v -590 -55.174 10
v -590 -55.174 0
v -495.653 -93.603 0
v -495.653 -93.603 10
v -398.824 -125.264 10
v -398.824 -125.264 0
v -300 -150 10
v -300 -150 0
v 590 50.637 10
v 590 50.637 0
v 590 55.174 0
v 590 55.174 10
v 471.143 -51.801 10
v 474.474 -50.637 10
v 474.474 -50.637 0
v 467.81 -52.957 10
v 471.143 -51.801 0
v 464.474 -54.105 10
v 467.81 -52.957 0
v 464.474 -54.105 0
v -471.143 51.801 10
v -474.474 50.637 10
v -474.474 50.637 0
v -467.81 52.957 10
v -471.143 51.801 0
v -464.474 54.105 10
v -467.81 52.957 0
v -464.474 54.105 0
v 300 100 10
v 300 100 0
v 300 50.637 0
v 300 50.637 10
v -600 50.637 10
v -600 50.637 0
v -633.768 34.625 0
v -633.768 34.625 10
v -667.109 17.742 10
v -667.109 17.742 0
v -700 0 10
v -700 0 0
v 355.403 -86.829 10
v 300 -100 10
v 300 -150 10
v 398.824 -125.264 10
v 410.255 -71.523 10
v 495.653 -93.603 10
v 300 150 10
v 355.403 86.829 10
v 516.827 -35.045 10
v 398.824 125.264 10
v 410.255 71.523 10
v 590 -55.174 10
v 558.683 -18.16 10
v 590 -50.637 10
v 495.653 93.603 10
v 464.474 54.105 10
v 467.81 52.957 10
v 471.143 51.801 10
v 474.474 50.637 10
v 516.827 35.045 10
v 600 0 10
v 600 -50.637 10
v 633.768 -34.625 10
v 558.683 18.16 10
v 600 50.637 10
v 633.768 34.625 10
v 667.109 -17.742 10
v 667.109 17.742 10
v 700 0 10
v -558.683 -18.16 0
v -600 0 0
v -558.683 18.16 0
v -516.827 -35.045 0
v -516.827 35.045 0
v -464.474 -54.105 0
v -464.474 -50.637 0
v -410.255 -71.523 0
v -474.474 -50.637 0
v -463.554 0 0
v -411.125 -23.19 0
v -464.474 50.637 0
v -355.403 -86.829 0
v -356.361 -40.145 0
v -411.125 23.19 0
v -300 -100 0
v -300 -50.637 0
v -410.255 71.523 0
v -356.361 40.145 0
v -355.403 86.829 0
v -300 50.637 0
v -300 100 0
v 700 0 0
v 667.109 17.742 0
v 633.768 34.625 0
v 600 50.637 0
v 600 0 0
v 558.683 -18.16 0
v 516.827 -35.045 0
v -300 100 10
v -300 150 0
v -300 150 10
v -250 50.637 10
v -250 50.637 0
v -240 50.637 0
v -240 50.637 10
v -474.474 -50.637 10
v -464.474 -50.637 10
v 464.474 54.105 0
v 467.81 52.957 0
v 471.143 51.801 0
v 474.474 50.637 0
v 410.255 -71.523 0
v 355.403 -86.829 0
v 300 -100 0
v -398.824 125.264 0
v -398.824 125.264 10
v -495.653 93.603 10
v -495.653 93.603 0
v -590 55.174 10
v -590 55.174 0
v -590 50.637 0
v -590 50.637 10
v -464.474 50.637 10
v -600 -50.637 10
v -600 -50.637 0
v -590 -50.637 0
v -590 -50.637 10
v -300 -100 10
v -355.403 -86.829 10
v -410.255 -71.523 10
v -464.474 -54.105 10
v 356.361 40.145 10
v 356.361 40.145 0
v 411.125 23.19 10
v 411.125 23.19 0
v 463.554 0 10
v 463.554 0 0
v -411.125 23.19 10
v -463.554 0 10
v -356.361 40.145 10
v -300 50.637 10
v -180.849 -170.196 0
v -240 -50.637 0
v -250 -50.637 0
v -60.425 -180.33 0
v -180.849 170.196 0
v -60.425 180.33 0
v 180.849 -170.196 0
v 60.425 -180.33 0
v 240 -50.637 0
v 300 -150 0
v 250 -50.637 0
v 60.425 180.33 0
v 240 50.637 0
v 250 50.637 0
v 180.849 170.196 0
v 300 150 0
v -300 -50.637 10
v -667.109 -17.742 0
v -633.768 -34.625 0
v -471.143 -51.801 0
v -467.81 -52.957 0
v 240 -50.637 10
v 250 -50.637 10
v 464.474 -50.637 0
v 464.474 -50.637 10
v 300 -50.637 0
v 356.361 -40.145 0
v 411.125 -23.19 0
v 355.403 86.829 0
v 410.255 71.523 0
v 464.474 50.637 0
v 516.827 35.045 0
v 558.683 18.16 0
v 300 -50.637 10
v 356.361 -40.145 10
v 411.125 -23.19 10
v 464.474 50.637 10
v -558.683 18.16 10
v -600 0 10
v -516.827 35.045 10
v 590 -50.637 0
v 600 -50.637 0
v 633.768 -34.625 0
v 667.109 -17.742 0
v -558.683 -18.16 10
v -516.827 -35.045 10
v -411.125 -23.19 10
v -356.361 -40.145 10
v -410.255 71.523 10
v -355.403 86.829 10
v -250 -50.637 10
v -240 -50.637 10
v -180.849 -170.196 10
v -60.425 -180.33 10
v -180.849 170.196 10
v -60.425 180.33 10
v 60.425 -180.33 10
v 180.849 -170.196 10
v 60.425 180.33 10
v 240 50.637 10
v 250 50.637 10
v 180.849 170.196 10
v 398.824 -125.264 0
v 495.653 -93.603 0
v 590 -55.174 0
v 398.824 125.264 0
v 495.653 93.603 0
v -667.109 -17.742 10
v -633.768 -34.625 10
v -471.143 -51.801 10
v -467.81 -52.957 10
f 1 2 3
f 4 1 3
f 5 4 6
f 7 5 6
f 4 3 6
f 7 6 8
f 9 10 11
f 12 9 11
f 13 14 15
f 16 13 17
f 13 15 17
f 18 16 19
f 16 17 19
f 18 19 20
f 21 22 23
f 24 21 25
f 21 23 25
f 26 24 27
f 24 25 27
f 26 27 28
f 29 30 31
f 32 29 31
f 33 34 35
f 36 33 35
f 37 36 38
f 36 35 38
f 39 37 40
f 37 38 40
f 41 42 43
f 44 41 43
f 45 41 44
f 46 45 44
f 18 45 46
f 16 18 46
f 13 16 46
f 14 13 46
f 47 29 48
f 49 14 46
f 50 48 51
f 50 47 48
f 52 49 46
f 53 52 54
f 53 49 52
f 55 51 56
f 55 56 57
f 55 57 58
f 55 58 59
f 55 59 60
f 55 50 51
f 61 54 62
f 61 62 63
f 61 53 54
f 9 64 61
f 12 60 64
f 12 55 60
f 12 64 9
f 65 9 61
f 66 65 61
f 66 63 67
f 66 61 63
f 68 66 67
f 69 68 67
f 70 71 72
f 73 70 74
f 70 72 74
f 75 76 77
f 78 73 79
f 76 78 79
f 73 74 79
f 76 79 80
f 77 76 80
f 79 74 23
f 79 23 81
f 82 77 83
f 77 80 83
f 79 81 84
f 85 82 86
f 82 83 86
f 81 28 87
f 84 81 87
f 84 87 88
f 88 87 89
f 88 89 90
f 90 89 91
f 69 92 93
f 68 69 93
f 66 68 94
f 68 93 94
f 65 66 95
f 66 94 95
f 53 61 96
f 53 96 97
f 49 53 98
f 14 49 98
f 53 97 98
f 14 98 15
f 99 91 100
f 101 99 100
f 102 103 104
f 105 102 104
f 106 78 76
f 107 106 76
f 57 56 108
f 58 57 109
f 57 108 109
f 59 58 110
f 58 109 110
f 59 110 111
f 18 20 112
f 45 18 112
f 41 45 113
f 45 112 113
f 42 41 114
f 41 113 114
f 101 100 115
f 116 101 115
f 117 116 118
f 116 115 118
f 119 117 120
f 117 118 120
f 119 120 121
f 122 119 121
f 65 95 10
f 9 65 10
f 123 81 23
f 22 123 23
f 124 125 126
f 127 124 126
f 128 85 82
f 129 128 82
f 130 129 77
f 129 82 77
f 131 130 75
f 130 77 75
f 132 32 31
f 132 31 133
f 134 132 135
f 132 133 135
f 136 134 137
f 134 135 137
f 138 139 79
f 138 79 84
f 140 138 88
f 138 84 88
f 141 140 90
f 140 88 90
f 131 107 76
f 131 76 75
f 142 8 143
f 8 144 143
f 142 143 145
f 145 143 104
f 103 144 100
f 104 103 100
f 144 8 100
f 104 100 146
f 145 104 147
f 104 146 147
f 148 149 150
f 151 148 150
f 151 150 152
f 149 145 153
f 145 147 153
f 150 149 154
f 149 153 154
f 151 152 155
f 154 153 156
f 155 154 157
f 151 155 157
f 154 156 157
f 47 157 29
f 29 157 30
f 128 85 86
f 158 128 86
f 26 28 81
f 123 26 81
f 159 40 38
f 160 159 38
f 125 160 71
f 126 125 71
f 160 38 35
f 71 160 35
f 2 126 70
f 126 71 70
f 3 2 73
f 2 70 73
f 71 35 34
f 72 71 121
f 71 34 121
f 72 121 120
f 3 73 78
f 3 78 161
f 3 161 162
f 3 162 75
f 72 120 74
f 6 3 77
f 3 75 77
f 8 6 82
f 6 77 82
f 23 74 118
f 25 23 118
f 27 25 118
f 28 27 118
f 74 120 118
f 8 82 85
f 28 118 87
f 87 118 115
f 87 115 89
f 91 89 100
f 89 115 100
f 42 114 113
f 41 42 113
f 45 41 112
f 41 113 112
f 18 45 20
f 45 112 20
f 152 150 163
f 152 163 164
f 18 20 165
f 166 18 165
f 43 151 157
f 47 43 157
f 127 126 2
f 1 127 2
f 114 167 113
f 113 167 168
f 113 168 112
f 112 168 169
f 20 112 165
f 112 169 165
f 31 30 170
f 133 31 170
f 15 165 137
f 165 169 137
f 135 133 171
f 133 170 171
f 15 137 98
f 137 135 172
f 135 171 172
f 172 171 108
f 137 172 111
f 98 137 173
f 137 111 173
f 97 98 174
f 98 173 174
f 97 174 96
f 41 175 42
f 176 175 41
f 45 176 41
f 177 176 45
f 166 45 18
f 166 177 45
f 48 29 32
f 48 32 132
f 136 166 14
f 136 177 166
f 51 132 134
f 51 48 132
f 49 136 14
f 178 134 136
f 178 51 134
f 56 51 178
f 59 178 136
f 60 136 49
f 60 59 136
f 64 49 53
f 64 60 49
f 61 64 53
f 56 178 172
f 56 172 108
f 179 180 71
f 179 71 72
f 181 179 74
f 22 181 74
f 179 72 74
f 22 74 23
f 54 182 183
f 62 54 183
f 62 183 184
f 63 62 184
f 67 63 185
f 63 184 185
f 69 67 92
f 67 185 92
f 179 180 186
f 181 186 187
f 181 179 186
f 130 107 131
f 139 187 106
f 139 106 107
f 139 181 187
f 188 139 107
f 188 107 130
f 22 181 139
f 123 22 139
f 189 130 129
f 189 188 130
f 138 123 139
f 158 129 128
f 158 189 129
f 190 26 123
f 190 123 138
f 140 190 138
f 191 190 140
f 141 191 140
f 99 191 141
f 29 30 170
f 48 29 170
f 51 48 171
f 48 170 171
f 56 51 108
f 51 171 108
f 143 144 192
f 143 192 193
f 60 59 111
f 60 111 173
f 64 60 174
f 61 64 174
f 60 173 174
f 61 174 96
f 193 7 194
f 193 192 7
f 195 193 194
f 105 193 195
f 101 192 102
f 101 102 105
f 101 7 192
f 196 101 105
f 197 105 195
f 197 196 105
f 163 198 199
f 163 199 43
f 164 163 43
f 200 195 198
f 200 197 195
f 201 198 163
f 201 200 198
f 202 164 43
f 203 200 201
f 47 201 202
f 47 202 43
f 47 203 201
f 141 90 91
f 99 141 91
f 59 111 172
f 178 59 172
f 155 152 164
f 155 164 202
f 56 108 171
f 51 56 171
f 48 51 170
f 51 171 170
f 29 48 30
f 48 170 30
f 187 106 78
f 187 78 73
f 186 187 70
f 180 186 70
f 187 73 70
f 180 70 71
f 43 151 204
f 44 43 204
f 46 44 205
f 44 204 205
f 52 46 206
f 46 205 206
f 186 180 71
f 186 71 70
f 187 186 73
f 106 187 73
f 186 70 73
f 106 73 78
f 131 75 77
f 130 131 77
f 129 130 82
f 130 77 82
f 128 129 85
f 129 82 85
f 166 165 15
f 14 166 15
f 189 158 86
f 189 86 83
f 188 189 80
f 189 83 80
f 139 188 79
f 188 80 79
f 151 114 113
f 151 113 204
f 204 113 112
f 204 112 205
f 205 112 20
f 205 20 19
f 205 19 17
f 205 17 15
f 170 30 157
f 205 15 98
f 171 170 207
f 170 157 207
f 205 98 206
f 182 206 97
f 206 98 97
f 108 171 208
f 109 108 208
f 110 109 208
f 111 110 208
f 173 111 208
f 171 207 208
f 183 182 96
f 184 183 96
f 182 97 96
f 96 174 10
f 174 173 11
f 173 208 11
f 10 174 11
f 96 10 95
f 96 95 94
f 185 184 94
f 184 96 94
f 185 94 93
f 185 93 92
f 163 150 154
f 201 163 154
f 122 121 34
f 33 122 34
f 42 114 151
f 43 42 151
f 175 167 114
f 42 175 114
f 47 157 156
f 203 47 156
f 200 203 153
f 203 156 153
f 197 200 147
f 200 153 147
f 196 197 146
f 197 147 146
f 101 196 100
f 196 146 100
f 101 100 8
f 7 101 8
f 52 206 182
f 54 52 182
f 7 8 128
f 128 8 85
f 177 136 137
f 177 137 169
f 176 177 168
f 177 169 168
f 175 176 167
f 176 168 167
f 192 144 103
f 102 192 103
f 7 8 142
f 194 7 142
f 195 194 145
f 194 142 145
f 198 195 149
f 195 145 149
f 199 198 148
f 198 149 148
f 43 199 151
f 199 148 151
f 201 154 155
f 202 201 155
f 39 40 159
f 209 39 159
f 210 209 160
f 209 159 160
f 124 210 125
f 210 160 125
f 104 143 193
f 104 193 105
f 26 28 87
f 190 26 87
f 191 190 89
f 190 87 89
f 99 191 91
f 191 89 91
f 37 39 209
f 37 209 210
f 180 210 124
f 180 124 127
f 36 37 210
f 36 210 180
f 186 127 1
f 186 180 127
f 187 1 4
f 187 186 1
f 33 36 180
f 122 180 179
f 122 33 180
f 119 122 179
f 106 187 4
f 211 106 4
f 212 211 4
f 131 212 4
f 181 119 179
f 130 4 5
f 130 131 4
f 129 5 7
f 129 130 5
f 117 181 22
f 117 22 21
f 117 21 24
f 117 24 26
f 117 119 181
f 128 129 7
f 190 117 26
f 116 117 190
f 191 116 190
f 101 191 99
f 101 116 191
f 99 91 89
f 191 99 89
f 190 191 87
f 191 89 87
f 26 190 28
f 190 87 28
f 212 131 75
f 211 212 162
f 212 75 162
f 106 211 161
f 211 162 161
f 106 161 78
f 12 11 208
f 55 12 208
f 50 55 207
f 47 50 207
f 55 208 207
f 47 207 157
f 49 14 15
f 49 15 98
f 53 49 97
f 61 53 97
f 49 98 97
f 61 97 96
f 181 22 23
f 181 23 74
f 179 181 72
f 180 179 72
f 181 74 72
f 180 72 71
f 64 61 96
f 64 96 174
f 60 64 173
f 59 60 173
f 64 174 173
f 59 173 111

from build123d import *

# Parameters (mm, degrees)
F1_DEPTH = 10
F0_W     = 10
F0_H     = 101.273576
F2_DEPTH = 10
F3_DEPTH = 10


with BuildPart() as f1:
    # F0 (on Top) → F1 (new body)
    with BuildSketch(Plane.XY):
        with BuildLine():
            ThreePointArc((590, 55.174481), (447.518681, 110.289992), (300, 150))
            Line((300, 150), (300, 100))
            ThreePointArc((300, 100), (382.90347, 79.441189), (464.473721, 54.104573))
            ThreePointArc((464.473721, 54.104573), (469.47684, 52.379676), (474.473721, 50.636788))
            ThreePointArc((474.473721, 50.636788), (537.81967, 26.763153), (600, 0))
            ThreePointArc((600, 0), (537.81967, -26.763153), (474.473721, -50.636788))
            ThreePointArc((474.473721, -50.636788), (469.47684, -52.379676), (464.473721, -54.104573))
            ThreePointArc((464.473721, -54.104573), (382.90347, -79.441189), (300, -100))
            Line((300, -100), (300, -150))
            ThreePointArc((300, -150), (447.518681, -110.289992), (590, -55.174481))
            Line((590, -55.174481), (590, -50.636788))
            Line((590, -50.636788), (600, -50.636788))
            ThreePointArc((600, -50.636788), (650.492906, -26.291809), (700, 0))
            ThreePointArc((700, 0), (650.492906, 26.291809), (600, 50.636788))
            Line((600, 50.636788), (590, 50.636788))
            Line((590, 50.636788), (590, 55.174481))
        make_face()
        with BuildLine():
            Line((-300, 100), (-300, 150))
            ThreePointArc((-300, 150), (-447.518681, 110.289992), (-590, 55.174481))
            Line((-590, 55.174481), (-590, 50.636788))
            Line((-590, 50.636788), (-600, 50.636788))
            ThreePointArc((-600, 50.636788), (-650.492906, 26.291809), (-700, 0))
            ThreePointArc((-700, 0), (-650.492906, -26.291809), (-600, -50.636788))
            Line((-600, -50.636788), (-590, -50.636788))
            Line((-590, -50.636788), (-590, -55.174481))
            ThreePointArc((-590, -55.174481), (-447.518681, -110.289992), (-300, -150))
            Line((-300, -150), (-300, -100))
            ThreePointArc((-300, -100), (-382.90347, -79.441189), (-464.473721, -54.104573))
            ThreePointArc((-464.473721, -54.104573), (-469.47684, -52.379676), (-474.473721, -50.636788))
            ThreePointArc((-474.473721, -50.636788), (-537.81967, -26.763153), (-600, 0))
            ThreePointArc((-600, 0), (-537.81967, 26.763153), (-474.473721, 50.636788))
            ThreePointArc((-474.473721, 50.636788), (-469.47684, 52.379676), (-464.473721, 54.104573))
            ThreePointArc((-464.473721, 54.104573), (-382.90347, 79.441189), (-300, 100))
        make_face()
    extrude(amount=F1_DEPTH)


with BuildPart() as f2:
    # F0 (on Top) → F2 (new body)
    with BuildSketch(Plane.XY):
        with BuildLine():
            Line((300, 100), (300, 150))
            ThreePointArc((300, 150), (0, 181.598185), (-300, 150))
            Line((-300, 150), (-300, 100))
            Line((-300, 100), (-300, 50.636788))
            Line((-300, 50.636788), (-300, -50.636788))
            Line((-300, -50.636788), (-300, -100))
            Line((-300, -100), (-300, -150))
            ThreePointArc((-300, -150), (0, -181.598185), (300, -150))
            Line((300, -150), (300, -100))
            Line((300, -100), (300, -50.636788))
            Line((300, -50.636788), (300, 50.636788))
            Line((300, 50.636788), (300, 100))
        make_face()
        with Locations((-245, 0)):
            Rectangle(F0_W, F0_H, mode=Mode.SUBTRACT)
        with Locations((245, 0)):
            Rectangle(F0_W, F0_H, mode=Mode.SUBTRACT)
    extrude(amount=F2_DEPTH)


with BuildPart() as f3:
    # F0 (on Top) → F3 (new body)
    with BuildSketch(Plane.XY):
        with BuildLine():
            Line((-300, 50.636788), (-300, 100))
            ThreePointArc((-300, 100), (-382.90347, 79.441189), (-464.473721, 54.104573))
            Line((-464.473721, 54.104573), (-464.473721, 50.636788))
            Line((-464.473721, 50.636788), (-474.473721, 50.636788))
            ThreePointArc((-474.473721, 50.636788), (-537.81967, 26.763153), (-600, 0))
            ThreePointArc((-600, 0), (-537.81967, -26.763153), (-474.473721, -50.636788))
            Line((-474.473721, -50.636788), (-464.473721, -50.636788))
            Line((-464.473721, -50.636788), (-464.473721, -54.104573))
            ThreePointArc((-464.473721, -54.104573), (-382.90347, -79.441189), (-300, -100))
            Line((-300, -100), (-300, -50.636788))
            ThreePointArc((-300, -50.636788), (-383.988967, -32.463493), (-463.553637, 0))
            ThreePointArc((-463.553637, 0), (-383.988967, 32.463493), (-300, 50.636788))
        make_face()
        with BuildLine():
            ThreePointArc((464.473721, 54.104573), (382.90347, 79.441189), (300, 100))
            Line((300, 100), (300, 50.636788))
            ThreePointArc((300, 50.636788), (383.988967, 32.463493), (463.553637, 0))
            ThreePointArc((463.553637, 0), (383.988967, -32.463493), (300, -50.636788))
            Line((300, -50.636788), (300, -100))
            ThreePointArc((300, -100), (382.90347, -79.441189), (464.473721, -54.104573))
            Line((464.473721, -54.104573), (464.473721, -50.636788))
            Line((464.473721, -50.636788), (474.473721, -50.636788))
            ThreePointArc((474.473721, -50.636788), (537.81967, -26.763153), (600, 0))
            ThreePointArc((600, 0), (537.81967, 26.763153), (474.473721, 50.636788))
            Line((474.473721, 50.636788), (464.473721, 50.636788))
            Line((464.473721, 50.636788), (464.473721, 54.104573))
        make_face()
    extrude(amount=F3_DEPTH)


solid = Compound([f1.part, f2.part, f3.part])
